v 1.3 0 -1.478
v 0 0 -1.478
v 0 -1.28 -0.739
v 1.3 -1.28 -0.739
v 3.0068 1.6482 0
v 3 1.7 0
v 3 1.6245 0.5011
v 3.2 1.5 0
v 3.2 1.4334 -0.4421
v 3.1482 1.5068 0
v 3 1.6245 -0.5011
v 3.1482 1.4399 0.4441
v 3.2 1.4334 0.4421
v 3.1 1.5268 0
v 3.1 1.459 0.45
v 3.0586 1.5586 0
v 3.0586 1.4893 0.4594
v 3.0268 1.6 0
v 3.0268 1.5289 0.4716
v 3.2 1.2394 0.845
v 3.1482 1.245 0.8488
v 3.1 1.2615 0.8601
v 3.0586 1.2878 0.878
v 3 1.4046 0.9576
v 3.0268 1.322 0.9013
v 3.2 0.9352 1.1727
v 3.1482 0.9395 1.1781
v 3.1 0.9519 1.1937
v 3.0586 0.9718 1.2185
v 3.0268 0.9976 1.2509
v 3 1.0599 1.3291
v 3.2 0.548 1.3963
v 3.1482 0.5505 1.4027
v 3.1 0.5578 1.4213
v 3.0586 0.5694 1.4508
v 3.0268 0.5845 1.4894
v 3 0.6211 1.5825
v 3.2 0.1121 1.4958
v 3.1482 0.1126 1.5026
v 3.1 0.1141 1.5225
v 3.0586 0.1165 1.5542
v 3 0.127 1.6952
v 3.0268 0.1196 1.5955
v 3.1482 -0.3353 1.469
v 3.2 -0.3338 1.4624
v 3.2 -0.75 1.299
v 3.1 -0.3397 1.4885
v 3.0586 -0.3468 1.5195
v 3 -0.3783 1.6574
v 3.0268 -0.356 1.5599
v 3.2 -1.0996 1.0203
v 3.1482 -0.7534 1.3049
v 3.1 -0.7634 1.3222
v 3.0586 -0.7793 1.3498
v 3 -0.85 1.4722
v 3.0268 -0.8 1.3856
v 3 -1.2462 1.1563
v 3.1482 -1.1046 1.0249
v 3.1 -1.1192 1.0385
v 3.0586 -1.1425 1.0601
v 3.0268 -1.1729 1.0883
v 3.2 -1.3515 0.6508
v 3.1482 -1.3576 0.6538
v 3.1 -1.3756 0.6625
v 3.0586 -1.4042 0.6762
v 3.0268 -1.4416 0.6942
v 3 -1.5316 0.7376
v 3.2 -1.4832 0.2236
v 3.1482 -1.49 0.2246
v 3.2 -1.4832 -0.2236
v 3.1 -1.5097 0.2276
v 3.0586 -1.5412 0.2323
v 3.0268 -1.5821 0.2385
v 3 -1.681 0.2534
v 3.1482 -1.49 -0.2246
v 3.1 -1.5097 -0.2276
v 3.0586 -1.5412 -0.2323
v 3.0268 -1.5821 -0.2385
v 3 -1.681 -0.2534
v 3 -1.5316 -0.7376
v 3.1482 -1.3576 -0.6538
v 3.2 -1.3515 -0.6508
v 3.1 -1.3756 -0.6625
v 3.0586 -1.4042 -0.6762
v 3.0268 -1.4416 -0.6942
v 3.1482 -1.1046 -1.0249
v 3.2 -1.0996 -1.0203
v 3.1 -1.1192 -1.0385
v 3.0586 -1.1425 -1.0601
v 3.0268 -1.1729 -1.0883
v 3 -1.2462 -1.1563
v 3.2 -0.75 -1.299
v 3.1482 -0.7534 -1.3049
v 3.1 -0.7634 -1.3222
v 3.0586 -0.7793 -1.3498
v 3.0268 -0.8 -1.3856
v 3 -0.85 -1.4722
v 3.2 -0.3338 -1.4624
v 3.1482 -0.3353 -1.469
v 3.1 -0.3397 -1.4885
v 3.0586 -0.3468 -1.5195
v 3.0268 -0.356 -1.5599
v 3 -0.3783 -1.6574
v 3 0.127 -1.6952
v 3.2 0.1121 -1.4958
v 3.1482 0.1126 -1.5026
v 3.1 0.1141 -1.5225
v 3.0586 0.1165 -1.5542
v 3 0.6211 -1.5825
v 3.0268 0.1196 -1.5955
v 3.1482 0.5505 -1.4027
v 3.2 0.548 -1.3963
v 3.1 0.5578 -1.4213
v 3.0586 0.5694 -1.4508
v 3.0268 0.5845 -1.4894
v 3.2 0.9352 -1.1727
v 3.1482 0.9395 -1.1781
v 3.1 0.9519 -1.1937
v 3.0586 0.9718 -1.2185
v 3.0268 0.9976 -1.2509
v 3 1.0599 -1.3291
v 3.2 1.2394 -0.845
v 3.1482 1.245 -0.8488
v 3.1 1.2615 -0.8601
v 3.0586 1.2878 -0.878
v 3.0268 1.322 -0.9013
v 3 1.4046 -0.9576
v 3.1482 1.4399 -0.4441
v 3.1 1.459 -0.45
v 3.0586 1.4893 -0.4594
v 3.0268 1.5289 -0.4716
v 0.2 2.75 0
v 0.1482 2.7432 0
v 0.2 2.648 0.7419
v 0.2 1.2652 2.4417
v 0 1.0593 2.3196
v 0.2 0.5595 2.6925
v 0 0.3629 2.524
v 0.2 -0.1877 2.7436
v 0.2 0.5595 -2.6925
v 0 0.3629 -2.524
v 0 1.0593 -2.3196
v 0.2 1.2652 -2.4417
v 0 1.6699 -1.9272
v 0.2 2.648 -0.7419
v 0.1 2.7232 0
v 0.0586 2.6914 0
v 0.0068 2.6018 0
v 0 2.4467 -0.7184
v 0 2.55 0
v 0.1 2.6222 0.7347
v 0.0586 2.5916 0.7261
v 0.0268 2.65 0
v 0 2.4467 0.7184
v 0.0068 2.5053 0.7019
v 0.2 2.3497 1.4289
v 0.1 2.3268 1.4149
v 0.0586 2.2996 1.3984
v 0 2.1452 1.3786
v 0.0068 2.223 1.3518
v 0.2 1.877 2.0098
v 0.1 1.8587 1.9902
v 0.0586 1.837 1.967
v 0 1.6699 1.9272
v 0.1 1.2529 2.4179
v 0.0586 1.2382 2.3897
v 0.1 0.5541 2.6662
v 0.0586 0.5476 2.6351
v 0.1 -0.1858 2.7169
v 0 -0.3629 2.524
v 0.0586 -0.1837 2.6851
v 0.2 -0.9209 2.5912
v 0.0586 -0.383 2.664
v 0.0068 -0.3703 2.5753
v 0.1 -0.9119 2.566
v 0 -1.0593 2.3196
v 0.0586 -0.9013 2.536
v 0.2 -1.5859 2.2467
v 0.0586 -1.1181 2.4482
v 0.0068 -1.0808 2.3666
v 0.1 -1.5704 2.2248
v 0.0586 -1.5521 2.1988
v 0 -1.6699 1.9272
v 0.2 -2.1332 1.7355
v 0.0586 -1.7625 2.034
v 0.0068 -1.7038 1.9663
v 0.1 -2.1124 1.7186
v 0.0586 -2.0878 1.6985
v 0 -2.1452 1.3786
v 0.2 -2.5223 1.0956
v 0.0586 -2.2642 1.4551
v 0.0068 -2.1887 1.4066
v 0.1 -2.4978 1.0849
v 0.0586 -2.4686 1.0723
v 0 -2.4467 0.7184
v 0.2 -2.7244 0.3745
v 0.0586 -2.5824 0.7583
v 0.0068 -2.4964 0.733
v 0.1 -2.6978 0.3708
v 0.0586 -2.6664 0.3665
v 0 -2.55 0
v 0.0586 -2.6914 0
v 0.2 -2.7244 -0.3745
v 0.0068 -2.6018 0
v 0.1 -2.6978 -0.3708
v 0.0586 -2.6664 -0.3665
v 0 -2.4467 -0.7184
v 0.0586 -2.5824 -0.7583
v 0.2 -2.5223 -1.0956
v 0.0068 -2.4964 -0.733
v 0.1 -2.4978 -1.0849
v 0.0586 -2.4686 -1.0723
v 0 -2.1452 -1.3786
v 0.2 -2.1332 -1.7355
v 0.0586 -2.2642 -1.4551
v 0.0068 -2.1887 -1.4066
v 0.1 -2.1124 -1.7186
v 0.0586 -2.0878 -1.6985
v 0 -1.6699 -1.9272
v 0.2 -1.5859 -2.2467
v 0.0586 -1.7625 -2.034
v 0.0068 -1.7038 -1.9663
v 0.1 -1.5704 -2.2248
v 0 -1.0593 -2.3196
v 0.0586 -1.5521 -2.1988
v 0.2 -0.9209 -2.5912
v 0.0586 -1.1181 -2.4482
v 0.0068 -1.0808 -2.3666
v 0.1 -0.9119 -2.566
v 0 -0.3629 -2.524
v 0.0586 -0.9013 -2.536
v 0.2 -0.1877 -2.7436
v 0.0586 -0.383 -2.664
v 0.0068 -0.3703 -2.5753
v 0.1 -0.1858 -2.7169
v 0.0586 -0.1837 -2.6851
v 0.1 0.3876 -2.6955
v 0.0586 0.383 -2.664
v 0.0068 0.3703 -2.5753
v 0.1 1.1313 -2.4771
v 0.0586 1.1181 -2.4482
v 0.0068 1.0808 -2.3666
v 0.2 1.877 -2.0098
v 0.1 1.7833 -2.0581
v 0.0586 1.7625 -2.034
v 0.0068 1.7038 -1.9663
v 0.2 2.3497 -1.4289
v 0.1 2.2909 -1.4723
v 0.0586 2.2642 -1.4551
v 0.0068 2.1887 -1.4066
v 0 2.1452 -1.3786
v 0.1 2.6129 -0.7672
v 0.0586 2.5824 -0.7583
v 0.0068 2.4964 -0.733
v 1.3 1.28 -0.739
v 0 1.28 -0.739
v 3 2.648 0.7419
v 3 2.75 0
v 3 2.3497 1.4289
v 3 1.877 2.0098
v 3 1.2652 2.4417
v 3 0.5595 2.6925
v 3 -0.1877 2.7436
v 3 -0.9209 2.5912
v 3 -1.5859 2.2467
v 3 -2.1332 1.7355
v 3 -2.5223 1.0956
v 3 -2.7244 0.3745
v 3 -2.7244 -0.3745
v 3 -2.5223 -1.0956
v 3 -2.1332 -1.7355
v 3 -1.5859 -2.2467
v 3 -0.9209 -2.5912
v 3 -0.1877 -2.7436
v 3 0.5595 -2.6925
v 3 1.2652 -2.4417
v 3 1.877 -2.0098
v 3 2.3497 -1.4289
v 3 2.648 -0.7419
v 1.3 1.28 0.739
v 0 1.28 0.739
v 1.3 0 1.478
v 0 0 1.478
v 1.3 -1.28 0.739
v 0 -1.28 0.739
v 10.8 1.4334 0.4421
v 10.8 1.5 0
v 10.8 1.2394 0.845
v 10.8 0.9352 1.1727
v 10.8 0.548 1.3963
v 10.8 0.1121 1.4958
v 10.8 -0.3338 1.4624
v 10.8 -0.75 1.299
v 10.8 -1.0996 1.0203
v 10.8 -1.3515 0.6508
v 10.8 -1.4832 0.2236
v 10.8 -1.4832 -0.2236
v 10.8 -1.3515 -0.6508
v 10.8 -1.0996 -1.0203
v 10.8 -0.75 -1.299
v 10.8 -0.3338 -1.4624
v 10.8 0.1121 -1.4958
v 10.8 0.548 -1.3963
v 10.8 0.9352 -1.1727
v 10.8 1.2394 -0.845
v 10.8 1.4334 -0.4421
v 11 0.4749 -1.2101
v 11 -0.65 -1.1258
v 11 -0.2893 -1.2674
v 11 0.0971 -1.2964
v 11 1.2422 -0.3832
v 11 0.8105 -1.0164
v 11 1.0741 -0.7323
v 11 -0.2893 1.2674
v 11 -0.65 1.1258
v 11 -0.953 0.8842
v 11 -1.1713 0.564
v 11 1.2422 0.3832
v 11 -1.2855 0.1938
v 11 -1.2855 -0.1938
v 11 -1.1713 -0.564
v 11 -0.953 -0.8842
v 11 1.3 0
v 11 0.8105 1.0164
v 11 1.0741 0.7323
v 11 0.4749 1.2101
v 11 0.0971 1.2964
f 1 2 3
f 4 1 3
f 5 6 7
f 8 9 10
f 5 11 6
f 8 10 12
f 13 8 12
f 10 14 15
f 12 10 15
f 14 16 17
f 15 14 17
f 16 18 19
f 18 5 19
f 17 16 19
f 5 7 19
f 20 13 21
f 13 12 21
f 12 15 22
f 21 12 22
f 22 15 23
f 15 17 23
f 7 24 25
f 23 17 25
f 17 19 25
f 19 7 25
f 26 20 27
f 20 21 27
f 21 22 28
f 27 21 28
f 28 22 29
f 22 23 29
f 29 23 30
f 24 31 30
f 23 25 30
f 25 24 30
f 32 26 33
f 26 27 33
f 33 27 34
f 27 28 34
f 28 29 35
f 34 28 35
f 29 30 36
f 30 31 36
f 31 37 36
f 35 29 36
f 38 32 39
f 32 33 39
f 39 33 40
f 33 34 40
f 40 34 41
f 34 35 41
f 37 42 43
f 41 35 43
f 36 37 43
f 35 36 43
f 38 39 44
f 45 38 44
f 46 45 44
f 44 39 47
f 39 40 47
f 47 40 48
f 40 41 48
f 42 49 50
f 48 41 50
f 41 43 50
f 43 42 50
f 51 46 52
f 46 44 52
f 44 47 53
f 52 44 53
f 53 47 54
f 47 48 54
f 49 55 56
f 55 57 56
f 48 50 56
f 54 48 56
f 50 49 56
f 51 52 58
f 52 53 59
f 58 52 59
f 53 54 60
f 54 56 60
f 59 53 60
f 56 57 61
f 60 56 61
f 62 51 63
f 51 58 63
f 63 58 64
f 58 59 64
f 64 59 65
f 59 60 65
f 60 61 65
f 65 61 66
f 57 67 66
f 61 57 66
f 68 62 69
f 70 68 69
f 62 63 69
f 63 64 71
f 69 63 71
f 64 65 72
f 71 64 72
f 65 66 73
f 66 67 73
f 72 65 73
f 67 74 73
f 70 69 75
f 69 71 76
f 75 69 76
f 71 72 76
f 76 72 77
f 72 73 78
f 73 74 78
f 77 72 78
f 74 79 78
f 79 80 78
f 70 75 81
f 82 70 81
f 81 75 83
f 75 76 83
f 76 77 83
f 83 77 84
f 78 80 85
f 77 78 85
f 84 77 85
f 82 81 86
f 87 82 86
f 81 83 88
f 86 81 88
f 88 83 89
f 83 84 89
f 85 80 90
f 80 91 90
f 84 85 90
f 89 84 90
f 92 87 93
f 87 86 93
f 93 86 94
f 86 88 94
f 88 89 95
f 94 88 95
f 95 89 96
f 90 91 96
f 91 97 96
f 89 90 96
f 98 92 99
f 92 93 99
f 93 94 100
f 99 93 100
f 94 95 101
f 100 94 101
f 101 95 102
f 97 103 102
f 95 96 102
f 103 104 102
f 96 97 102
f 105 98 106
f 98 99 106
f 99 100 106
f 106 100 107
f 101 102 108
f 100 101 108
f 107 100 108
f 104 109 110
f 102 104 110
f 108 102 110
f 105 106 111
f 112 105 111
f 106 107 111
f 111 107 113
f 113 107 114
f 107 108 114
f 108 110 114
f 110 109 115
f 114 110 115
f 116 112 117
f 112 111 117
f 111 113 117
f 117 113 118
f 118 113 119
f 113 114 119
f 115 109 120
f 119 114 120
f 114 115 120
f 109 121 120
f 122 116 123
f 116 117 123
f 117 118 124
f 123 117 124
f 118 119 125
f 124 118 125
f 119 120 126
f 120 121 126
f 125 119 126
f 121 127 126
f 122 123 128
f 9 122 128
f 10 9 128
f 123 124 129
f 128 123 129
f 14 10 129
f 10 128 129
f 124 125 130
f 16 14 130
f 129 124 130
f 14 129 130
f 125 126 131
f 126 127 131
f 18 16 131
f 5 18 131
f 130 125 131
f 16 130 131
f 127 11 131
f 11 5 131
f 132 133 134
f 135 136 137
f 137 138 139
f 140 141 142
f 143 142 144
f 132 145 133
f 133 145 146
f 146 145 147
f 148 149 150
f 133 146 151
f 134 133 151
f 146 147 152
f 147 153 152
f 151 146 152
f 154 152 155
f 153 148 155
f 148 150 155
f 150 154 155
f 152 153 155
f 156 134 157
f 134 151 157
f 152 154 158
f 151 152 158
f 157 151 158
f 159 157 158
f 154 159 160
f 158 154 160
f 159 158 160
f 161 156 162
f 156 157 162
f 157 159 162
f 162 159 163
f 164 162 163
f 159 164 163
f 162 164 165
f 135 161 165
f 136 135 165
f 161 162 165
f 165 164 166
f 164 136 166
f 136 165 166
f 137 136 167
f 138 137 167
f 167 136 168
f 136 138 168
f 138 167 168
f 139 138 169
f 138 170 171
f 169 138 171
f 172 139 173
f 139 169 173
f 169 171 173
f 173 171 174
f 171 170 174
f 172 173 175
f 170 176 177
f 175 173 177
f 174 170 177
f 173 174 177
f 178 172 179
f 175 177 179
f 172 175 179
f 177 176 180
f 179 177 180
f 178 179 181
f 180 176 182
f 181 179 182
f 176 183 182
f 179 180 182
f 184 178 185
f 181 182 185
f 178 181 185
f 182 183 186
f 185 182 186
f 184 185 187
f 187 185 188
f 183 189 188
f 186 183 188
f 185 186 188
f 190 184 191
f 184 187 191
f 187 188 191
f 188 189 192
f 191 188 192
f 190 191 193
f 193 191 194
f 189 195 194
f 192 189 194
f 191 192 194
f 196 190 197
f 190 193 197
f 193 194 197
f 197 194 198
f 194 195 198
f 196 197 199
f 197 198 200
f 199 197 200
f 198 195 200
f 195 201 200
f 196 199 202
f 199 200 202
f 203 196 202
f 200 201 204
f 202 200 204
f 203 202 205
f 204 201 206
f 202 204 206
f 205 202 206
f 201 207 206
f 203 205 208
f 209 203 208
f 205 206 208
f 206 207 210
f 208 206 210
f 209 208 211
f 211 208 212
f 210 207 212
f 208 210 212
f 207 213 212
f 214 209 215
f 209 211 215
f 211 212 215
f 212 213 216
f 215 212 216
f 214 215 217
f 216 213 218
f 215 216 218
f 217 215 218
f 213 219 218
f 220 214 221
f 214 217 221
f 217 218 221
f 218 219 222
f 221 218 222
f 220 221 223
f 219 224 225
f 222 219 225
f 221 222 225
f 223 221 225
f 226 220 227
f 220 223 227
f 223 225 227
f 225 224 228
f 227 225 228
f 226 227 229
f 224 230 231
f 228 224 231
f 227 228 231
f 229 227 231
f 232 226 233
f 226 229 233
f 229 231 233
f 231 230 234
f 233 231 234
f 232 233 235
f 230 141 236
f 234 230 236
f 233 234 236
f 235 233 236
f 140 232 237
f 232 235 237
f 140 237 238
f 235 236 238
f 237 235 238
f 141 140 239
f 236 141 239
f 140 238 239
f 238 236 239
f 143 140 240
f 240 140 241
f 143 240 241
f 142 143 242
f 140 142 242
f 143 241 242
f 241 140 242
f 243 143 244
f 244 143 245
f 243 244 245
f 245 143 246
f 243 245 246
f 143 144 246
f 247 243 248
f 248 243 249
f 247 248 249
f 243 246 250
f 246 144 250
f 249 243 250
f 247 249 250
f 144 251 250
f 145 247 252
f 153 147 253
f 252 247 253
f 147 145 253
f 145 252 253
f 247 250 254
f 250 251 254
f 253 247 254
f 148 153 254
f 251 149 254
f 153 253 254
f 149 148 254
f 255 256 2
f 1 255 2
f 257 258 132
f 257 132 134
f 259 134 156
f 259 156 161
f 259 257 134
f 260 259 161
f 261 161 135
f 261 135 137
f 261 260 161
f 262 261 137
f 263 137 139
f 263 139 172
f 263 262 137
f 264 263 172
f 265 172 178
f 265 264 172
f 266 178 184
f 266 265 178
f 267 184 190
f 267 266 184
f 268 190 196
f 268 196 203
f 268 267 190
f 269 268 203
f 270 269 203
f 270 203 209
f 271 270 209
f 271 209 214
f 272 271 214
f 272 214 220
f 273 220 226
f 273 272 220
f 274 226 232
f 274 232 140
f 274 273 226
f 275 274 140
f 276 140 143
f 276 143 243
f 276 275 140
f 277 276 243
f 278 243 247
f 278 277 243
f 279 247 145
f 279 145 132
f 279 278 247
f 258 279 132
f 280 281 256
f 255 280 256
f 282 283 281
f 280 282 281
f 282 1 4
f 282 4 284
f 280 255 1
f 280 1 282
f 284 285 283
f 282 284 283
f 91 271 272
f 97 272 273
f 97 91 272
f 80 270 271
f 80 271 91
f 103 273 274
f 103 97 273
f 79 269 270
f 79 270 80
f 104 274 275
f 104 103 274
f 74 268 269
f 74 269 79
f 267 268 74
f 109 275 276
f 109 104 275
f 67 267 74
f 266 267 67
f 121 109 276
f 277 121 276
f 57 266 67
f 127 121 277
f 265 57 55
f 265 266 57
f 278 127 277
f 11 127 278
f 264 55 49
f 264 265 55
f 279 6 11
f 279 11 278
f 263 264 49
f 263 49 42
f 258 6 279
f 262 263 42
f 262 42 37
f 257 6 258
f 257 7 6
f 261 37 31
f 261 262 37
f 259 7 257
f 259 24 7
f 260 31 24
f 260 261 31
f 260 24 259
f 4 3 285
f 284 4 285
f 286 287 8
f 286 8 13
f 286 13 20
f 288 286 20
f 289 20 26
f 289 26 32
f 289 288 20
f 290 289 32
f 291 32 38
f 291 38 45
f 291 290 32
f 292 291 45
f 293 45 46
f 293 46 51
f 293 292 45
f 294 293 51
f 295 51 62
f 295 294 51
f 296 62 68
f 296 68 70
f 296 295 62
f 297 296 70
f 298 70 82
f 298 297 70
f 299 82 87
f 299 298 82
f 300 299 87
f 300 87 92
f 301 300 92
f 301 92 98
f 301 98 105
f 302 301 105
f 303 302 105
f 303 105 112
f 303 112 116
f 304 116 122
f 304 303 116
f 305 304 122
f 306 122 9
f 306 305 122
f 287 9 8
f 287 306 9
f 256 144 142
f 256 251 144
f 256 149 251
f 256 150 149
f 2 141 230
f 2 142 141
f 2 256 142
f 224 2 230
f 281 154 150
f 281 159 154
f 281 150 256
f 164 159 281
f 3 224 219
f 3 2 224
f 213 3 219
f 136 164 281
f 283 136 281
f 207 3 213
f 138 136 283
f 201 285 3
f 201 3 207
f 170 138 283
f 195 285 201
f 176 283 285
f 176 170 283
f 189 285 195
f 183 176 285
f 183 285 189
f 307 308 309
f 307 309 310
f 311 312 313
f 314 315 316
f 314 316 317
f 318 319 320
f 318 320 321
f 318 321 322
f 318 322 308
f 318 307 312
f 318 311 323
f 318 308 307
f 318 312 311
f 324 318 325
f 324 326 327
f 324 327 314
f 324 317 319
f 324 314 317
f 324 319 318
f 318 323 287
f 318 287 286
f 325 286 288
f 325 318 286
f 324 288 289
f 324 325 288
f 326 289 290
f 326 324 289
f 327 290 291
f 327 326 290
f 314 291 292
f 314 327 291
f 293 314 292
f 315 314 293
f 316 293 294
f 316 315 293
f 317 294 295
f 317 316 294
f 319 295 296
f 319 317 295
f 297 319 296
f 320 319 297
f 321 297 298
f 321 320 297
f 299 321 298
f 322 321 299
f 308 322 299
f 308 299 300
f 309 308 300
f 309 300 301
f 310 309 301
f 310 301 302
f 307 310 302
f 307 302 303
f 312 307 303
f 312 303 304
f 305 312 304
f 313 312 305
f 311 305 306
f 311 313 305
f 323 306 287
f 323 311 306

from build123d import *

# Parameters (mm, degrees)
CHANFREIN1_SIZE         = 0.2
CONG_1_R                = 0.2
ENL_V_MAT_EXTRU_1_DEPTH = 1.3


with BuildPart() as part:
    # Esquisse1 → Révolution1 (revolve)
    with BuildSketch(Plane.XY):
        Polygon((0, 0), (0, 2.75), (3, 2.75), (3, 1.5), (11, 1.5), (11, 0), align=None)
    revolve(axis=Axis((0, 0, 0), (1, 0, 0)))

    # Chanfrein1
    chanfrein1_edges = [part.edges().sort_by_distance(p)[0] for p in [
        (11, -1.5, 0),
    ]]
    chamfer(chanfrein1_edges, length=CHANFREIN1_SIZE)

    # Congé1
    cong_1_edges = [part.edges().sort_by_distance(p)[0] for p in [
        (3, -1.5, 0),
        (0, -2.75, 0),
    ]]
    fillet(cong_1_edges, radius=CONG_1_R)

    # Esquisse2 → Enlèv. mat.-Extru.1 (cut)
    with BuildSketch(Plane.ZY):
        Polygon((0.739008345, -1.28), (1.478016689, 0), (0.739008345, 1.28), (-0.739008345, 1.28), (-1.478016689, 0), (-0.739008345, -1.28), align=None)
    extrude(amount=-ENL_V_MAT_EXTRU_1_DEPTH, mode=Mode.SUBTRACT)


solid = part.part
